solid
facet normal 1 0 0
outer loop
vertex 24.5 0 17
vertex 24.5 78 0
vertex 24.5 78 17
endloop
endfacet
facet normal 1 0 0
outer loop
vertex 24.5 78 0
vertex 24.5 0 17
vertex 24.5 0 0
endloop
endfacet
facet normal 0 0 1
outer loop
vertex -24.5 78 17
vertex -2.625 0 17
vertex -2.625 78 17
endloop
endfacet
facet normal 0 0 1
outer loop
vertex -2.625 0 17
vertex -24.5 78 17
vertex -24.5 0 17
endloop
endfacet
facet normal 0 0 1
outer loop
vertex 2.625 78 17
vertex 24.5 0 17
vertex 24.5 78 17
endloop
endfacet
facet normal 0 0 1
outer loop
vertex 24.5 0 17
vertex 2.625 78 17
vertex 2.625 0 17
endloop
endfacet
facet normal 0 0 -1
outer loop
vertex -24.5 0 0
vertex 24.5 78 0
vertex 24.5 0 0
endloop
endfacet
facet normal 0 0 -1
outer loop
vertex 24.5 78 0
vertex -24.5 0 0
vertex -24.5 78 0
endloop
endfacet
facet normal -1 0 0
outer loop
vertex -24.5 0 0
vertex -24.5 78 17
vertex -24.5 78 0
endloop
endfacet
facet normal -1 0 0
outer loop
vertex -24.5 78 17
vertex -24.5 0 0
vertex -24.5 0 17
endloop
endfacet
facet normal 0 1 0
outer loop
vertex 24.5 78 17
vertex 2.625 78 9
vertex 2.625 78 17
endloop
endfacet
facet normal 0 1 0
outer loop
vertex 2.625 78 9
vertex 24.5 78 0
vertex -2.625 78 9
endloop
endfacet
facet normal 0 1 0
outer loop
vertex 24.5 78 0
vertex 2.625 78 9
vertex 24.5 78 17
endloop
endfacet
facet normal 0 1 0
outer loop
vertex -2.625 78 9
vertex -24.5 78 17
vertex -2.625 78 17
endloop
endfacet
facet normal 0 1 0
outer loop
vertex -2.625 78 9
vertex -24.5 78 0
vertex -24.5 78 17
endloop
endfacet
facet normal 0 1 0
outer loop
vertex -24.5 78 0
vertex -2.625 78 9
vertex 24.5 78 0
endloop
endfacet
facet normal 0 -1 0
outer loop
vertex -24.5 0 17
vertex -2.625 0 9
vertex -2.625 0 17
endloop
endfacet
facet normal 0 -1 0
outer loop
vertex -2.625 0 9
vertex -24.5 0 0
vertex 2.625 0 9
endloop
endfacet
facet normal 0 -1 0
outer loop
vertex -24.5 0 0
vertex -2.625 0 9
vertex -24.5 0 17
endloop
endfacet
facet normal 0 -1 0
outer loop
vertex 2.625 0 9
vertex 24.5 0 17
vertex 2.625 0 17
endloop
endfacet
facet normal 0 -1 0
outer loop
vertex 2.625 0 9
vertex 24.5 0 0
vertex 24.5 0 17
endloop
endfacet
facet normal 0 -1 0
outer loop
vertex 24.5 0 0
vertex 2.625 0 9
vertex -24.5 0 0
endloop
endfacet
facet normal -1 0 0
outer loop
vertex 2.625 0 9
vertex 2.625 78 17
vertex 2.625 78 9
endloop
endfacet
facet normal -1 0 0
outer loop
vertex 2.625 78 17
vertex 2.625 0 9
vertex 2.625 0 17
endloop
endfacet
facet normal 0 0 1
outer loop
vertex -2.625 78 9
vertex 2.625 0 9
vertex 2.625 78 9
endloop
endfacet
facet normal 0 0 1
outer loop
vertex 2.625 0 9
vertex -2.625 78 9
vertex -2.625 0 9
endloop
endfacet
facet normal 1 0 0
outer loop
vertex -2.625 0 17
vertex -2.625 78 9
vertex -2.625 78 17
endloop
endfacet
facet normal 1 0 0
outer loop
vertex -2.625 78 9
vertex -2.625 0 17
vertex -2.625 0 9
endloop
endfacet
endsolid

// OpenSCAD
cutWid = 5.25;

difference() { 
   translate([-49/2,0,0]) cube([49,78,17]);
   translate([-cutWid/2,-0.25,17-8]) cube([cutWid,78.5,9]);
}
